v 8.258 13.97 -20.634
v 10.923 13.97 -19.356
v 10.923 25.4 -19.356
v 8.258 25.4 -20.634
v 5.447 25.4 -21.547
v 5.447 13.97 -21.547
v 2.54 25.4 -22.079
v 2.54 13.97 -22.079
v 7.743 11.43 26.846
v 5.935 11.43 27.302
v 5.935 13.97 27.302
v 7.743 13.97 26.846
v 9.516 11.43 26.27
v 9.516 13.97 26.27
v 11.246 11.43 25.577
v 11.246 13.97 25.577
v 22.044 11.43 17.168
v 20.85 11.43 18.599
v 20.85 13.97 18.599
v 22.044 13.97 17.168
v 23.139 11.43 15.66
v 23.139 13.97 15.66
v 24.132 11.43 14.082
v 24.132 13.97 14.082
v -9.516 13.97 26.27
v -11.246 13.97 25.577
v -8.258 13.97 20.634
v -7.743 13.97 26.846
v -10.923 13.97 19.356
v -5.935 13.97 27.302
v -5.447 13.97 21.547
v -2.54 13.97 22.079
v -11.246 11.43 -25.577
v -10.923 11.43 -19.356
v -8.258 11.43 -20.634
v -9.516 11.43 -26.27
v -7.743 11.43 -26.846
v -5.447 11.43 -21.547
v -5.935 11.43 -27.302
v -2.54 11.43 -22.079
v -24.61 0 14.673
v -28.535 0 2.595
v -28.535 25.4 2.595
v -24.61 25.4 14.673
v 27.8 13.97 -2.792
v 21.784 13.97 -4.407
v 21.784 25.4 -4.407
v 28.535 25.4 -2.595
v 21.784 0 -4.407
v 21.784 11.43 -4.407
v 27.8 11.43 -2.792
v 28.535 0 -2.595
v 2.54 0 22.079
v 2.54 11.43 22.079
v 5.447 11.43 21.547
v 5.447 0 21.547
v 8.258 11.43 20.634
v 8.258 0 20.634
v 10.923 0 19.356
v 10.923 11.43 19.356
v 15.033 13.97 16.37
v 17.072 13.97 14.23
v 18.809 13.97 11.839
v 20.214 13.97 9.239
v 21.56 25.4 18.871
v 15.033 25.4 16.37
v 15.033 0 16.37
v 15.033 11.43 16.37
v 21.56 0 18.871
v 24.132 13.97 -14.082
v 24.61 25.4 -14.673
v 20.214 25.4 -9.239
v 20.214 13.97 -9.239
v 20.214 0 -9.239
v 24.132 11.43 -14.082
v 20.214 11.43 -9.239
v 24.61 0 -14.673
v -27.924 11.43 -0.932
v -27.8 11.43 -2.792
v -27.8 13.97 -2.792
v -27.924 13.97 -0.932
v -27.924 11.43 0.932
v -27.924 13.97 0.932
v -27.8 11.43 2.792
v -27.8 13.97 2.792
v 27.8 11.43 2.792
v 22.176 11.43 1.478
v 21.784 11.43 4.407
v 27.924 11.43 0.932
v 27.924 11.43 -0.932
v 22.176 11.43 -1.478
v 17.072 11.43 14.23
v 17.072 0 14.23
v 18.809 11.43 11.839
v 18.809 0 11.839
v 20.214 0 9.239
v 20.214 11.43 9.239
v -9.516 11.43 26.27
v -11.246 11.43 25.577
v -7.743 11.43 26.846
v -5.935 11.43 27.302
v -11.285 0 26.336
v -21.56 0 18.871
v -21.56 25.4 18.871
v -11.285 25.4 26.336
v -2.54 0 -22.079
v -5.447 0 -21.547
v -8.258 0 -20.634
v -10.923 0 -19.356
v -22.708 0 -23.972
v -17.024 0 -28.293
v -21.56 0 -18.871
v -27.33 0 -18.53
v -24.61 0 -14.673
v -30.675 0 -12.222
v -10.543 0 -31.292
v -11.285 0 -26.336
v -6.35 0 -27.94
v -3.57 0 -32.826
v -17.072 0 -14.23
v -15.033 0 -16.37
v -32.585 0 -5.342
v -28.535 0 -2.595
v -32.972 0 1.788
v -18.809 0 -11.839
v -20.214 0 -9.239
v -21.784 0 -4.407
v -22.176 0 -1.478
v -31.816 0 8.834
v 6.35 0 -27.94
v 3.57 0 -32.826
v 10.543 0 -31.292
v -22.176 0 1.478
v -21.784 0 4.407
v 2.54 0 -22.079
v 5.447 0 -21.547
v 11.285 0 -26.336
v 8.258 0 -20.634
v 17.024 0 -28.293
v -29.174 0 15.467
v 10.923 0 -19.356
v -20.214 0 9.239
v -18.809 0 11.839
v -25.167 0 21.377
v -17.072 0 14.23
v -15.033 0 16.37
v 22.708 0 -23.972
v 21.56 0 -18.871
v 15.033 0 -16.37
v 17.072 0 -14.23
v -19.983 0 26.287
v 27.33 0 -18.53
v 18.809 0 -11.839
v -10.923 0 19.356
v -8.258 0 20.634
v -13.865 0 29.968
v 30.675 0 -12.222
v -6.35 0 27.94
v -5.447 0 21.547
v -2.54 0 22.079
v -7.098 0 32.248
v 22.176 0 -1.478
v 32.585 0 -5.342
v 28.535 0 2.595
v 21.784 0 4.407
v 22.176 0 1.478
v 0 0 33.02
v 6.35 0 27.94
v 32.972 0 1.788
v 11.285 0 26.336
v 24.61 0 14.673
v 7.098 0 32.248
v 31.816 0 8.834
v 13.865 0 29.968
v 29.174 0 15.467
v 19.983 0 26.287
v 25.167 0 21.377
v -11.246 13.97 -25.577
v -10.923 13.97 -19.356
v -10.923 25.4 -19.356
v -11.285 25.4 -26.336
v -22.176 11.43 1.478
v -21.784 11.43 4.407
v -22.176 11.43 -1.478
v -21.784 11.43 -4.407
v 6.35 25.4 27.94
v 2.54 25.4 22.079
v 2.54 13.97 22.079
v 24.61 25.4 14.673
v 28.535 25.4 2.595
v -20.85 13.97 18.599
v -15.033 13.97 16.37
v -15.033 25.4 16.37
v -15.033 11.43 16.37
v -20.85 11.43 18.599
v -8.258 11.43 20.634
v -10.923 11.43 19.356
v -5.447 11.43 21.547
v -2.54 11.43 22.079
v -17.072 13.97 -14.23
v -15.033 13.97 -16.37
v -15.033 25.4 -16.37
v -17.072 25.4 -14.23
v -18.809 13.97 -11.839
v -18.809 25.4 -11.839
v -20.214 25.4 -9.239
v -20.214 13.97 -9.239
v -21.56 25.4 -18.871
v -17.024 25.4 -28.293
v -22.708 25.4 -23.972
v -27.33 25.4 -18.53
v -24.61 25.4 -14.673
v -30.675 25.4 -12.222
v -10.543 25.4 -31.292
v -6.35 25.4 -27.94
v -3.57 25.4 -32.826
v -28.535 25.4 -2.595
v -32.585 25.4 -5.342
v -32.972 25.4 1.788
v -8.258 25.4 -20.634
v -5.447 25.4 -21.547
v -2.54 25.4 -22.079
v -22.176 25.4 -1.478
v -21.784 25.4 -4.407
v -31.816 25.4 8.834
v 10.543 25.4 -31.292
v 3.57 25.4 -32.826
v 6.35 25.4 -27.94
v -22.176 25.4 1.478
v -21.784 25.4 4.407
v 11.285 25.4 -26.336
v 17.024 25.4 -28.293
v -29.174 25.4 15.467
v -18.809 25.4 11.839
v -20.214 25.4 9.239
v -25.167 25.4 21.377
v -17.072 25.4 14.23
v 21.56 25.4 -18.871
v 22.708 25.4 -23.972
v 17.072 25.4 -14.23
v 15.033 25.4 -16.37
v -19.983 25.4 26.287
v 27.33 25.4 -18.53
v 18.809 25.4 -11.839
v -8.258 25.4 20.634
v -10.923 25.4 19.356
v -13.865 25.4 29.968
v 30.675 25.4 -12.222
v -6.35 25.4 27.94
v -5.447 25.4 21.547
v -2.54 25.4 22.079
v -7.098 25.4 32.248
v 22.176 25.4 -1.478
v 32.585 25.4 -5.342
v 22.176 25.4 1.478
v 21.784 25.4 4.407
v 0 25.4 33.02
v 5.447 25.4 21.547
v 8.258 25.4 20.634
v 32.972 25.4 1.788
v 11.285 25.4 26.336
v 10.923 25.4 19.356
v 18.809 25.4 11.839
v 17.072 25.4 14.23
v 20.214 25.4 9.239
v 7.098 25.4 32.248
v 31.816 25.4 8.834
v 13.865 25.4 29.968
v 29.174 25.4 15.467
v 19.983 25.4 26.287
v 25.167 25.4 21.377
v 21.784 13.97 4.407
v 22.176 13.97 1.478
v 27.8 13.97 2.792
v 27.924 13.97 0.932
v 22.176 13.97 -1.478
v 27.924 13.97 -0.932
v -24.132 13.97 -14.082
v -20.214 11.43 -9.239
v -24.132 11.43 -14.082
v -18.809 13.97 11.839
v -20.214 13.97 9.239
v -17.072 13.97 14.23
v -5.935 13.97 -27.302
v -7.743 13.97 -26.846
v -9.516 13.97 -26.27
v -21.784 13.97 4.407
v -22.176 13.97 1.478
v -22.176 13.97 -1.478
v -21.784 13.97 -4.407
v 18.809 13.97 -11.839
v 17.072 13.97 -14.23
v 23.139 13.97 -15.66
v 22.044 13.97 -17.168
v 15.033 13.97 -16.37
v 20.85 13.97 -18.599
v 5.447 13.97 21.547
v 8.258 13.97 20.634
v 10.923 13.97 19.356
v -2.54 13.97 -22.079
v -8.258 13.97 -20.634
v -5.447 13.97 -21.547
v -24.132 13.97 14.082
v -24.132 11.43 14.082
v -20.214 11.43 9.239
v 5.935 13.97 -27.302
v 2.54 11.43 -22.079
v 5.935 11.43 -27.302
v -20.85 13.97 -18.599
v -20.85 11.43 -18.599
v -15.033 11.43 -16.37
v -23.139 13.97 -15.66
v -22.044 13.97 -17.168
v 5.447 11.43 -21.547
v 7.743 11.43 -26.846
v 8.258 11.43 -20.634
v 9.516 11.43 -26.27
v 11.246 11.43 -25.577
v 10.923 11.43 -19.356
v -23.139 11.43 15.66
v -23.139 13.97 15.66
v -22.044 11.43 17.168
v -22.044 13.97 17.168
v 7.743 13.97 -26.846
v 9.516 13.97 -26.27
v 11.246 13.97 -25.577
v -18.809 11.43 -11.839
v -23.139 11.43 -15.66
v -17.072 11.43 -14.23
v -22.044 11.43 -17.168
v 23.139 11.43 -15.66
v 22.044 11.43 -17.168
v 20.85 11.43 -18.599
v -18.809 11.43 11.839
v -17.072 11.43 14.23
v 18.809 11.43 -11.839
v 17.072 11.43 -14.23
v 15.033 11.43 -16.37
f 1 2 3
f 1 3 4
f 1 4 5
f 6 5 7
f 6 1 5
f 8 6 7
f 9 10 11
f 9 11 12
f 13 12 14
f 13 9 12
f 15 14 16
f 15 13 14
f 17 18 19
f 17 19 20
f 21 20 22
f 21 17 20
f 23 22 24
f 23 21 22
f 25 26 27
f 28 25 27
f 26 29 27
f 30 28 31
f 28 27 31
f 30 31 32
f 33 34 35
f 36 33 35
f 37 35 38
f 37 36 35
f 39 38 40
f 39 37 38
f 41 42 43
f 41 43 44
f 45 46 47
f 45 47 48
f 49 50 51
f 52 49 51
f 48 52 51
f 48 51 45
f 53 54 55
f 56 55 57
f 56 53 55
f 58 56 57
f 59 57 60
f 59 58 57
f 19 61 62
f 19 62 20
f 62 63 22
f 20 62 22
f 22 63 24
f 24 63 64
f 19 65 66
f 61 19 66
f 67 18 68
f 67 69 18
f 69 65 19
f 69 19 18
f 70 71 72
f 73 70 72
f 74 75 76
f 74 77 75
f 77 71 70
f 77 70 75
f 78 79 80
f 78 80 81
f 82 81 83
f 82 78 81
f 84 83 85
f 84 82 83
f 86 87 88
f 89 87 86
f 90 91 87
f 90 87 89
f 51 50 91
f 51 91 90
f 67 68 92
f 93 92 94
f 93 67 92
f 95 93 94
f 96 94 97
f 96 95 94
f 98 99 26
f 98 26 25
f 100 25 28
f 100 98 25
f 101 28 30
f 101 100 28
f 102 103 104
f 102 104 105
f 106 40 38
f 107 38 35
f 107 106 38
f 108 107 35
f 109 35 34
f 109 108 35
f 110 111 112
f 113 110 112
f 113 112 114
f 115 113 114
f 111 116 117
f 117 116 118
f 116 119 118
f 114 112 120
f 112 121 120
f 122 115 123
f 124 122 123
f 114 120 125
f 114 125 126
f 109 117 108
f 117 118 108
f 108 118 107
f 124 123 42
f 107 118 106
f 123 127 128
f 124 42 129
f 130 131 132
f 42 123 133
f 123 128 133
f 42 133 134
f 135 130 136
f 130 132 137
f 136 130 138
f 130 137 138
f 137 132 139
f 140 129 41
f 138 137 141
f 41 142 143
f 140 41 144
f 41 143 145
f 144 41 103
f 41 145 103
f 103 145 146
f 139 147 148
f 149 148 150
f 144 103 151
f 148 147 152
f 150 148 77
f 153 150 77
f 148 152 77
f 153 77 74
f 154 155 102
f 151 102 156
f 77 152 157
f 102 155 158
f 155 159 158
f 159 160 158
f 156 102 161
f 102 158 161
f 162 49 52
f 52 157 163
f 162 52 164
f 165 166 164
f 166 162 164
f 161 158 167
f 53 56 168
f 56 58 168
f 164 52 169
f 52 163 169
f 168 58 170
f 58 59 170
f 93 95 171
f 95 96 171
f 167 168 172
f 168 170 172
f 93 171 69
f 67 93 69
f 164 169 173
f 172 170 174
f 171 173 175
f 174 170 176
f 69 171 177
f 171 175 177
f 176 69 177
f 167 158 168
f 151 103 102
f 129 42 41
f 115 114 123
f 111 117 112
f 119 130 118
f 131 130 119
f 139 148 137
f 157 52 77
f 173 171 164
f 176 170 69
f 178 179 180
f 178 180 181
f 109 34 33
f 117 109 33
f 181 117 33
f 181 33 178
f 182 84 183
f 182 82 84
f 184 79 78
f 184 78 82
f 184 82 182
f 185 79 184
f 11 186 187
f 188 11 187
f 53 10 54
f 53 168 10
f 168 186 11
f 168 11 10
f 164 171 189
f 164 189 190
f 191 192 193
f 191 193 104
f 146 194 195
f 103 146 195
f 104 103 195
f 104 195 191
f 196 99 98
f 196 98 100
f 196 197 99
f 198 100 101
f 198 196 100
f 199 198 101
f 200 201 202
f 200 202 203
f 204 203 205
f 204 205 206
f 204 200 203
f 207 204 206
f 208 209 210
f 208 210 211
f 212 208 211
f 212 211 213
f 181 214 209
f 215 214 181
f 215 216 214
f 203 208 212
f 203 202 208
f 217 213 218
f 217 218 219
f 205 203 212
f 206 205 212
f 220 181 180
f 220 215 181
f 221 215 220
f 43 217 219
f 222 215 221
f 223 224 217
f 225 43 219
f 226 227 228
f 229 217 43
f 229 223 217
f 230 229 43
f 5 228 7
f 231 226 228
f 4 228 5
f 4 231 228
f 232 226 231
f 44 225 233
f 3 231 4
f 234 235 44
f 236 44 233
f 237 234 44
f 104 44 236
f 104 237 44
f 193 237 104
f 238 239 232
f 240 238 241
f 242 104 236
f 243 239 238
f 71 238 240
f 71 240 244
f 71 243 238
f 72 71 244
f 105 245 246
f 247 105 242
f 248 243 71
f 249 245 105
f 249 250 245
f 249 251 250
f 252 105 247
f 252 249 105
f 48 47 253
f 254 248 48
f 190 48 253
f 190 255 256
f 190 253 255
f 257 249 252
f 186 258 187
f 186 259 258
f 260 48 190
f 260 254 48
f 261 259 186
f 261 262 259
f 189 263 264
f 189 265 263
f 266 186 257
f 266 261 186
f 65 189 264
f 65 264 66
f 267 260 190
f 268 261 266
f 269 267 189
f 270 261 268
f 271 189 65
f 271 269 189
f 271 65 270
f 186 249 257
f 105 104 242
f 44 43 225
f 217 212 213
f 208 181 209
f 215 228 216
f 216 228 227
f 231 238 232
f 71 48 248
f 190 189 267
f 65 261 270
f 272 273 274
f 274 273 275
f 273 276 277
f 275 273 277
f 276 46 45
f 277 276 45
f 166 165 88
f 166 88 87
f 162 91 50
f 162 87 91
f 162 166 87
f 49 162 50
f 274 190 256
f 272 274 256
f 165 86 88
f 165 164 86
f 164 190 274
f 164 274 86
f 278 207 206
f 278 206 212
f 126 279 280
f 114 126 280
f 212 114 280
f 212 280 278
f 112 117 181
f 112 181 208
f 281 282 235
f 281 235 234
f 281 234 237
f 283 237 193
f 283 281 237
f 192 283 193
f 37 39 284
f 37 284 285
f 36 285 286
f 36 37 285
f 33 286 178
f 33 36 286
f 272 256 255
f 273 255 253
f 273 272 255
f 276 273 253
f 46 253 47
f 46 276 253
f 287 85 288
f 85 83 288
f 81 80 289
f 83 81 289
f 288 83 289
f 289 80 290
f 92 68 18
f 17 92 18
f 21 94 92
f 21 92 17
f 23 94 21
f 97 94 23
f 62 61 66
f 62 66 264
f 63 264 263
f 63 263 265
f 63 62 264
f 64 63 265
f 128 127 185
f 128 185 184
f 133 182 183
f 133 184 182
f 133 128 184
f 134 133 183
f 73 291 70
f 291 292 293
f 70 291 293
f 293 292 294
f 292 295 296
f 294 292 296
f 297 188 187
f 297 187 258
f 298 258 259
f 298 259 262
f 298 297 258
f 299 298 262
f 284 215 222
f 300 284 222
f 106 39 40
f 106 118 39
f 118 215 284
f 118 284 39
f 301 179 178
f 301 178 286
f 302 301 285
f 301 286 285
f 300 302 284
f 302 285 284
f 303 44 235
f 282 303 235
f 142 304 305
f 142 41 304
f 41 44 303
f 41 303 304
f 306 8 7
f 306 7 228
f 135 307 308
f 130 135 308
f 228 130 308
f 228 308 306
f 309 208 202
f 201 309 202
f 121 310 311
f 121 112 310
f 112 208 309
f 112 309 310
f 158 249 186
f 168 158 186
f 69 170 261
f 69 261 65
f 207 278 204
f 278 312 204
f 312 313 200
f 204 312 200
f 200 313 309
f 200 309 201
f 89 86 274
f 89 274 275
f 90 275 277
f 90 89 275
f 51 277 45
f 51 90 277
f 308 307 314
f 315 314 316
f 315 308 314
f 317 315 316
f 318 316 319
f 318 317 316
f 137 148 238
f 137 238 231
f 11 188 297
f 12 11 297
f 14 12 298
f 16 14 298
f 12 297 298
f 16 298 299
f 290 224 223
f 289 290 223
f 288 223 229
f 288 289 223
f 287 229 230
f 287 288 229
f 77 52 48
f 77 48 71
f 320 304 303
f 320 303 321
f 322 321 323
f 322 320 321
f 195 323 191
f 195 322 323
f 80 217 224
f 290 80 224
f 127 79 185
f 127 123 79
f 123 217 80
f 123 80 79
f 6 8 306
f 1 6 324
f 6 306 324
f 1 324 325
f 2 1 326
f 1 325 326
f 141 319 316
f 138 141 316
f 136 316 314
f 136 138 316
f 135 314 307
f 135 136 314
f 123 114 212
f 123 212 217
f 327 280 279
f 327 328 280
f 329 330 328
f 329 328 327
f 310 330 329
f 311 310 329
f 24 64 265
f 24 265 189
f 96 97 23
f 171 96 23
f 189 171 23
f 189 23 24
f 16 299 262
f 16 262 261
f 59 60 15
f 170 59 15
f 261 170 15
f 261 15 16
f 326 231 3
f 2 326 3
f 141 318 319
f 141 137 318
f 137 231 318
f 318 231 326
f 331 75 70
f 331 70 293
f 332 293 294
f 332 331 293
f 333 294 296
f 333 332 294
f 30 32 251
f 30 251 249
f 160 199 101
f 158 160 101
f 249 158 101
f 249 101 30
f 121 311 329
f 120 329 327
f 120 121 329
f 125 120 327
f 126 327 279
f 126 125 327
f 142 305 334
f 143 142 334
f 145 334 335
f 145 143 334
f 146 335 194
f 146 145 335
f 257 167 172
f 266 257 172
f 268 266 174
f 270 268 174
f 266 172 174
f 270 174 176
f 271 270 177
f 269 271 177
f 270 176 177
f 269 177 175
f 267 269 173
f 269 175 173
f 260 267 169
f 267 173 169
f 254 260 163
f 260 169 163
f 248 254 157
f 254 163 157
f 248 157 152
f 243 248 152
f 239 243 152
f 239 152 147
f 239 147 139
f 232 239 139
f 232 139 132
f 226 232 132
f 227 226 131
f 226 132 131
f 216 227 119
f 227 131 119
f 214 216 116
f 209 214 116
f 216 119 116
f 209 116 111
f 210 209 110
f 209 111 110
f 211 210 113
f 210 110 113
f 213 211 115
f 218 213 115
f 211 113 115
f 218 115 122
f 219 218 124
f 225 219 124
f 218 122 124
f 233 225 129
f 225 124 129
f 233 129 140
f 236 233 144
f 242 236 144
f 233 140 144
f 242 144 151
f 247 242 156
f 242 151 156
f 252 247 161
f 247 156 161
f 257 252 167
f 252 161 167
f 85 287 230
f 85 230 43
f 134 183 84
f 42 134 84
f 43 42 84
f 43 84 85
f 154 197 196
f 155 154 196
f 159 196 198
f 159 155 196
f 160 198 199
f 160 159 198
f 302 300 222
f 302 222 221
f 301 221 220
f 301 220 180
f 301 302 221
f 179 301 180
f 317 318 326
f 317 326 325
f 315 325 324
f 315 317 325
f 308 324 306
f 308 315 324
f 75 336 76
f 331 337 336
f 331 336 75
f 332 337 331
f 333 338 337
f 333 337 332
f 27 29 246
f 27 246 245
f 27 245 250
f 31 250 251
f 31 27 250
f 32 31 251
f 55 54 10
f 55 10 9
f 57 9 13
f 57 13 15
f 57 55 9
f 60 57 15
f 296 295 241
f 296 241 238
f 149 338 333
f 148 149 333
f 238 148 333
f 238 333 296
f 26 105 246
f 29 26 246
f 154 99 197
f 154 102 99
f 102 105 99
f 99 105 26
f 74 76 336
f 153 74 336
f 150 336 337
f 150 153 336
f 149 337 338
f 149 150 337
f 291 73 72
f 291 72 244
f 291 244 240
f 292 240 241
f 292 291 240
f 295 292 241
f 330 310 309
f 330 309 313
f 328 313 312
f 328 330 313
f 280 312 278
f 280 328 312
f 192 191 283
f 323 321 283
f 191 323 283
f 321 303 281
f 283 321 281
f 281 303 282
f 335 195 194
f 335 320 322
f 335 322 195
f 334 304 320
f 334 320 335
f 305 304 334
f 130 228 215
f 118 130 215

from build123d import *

# Parameters (mm, degrees)
SKETCH1_R           = 33.02
SKETCH1_R_2         = 22.225
BOSS_EXTRUDE1_DEPTH = 25.4
CAVITY1_DEPTH       = 25.4
CAVITY1_START       = 11.43
CAVITY1_2_DEPTH     = 2.54


# Read off the part's stored shape, not the designer's step: Cavity1
with BuildPart() as part:
    # Sketch1 → Boss-Extrude1 (new body)
    with BuildSketch(Plane(origin=(0, 0, 0), x_dir=(1, 0, 0), z_dir=(0, 1, 0))):
        with Locations(Location((0, 0, 0), (0, 0, 270))):
            Circle(SKETCH1_R)
        with Locations(Location((0, 0, 0), (0, 0, 270))):
            Circle(SKETCH1_R_2, mode=Mode.SUBTRACT)
    extrude(amount=BOSS_EXTRUDE1_DEPTH)

    # Cavity1 outline → Cavity1 (cut)
    with BuildSketch(Plane(origin=(0, 0, 0), x_dir=(1, 0, 0), z_dir=(0, 1, 0))):
        with BuildLine():
            Line((-6.35, -27.94), (6.35, -27.94))
            Line((6.35, -27.94), (2.54, -22.079380086))
            ThreePointArc((2.54, -22.079380086), (0, -22.225), (-2.54, -22.079380086))
            Line((-2.54, -22.079380086), (-6.35, -27.94))
        make_face()
        with BuildLine():
            Line((10.923030829, -19.355568256), (11.285462035, -26.336371175))
            Line((11.285462035, -26.336371175), (21.559977863, -18.871498471))
            Line((21.559977863, -18.871498471), (15.03283716, -16.369619174))
            ThreePointArc((15.03283716, -16.369619174), (13.063527232, -17.9804027), (10.923030829, -19.355568256))
        make_face()
        with BuildLine():
            Line((-11.285462035, -26.336371175), (-10.923030829, -19.355568256))
            ThreePointArc((-10.923030829, -19.355568256), (-13.063527232, -17.9804027), (-15.03283716, -16.369619174))
            Line((-15.03283716, -16.369619174), (-21.559977863, -18.871498471))
            Line((-21.559977863, -18.871498471), (-11.285462035, -26.336371175))
        make_face()
        with BuildLine():
            ThreePointArc((21.783641473, -4.407220121), (21.137231075, -6.8679027), (20.213835141, -9.238587223))
            Line((20.213835141, -9.238587223), (24.610261151, -14.673143701))
            Line((24.610261151, -14.673143701), (28.53477698, -2.594725944))
            Line((28.53477698, -2.594725944), (21.783641473, -4.407220121))
        make_face()
        with BuildLine():
            Line((-24.610261151, -14.673143701), (-20.213835141, -9.238587223))
            ThreePointArc((-20.213835141, -9.238587223), (-21.137231075, -6.8679027), (-21.783641473, -4.407220121))
            Line((-21.783641473, -4.407220121), (-28.53477698, -2.594725944))
            Line((-28.53477698, -2.594725944), (-24.610261151, -14.673143701))
        make_face()
        with BuildLine():
            Line((-28.53477698, 2.594725944), (-21.783641473, 4.407220121))
            ThreePointArc((-21.783641473, 4.407220121), (-21.137231075, 6.8679027), (-20.213835141, 9.238587223))
            Line((-20.213835141, 9.238587223), (-24.610261151, 14.673143701))
            Line((-24.610261151, 14.673143701), (-28.53477698, 2.594725944))
        make_face()
        with BuildLine():
            Line((21.783641473, 4.407220121), (28.53477698, 2.594725944))
            Line((28.53477698, 2.594725944), (24.610261151, 14.673143701))
            Line((24.610261151, 14.673143701), (20.213835141, 9.238587223))
            ThreePointArc((20.213835141, 9.238587223), (21.137231075, 6.8679027), (21.783641473, 4.407220121))
        make_face()
        with BuildLine():
            Line((-21.559977863, 18.871498471), (-15.03283716, 16.369619174))
            ThreePointArc((-15.03283716, 16.369619174), (-13.063527232, 17.9804027), (-10.923030829, 19.355568256))
            Line((-10.923030829, 19.355568256), (-11.285462035, 26.336371175))
            Line((-11.285462035, 26.336371175), (-21.559977863, 18.871498471))
        make_face()
        with BuildLine():
            ThreePointArc((10.923030829, 19.355568256), (13.063527232, 17.9804027), (15.03283716, 16.369619174))
            Line((15.03283716, 16.369619174), (21.559977863, 18.871498471))
            Line((21.559977863, 18.871498471), (11.285462035, 26.336371175))
            Line((11.285462035, 26.336371175), (10.923030829, 19.355568256))
        make_face()
        with BuildLine():
            Line((-6.35, 27.94), (-2.54, 22.079380086))
            ThreePointArc((-2.54, 22.079380086), (0, 22.225), (2.54, 22.079380086))
            Line((2.54, 22.079380086), (6.35, 27.94))
            Line((6.35, 27.94), (-6.35, 27.94))
        make_face()
    extrude(amount=CAVITY1_DEPTH, mode=Mode.SUBTRACT)

    # Cavity1 2 outline → Cavity1 2 (cut)
    with BuildSketch(Plane(origin=(0, 0, 0), x_dir=(1, 0, 0), z_dir=(0, 1, 0)).offset(CAVITY1_START)):
        with BuildLine():
            Line((2.54, -22.079380086), (5.935416317, -27.3022789))
            ThreePointArc((5.935416317, -27.3022789), (8.633934823, -26.572519065), (11.246024223, -25.576757793))
            Line((11.246024223, -25.576757793), (10.923030829, -19.355568256))
            ThreePointArc((10.923030829, -19.355568256), (6.8679027, -21.137231075), (2.54, -22.079380086))
        make_face()
        with BuildLine():
            ThreePointArc((-11.246024223, -25.576757793), (-8.633934823, -26.572519065), (-5.935416317, -27.3022789))
            Line((-5.935416317, -27.3022789), (-2.54, -22.079380086))
            ThreePointArc((-2.54, -22.079380086), (-6.8679027, -21.137231075), (-10.923030829, -19.355568256))
            Line((-10.923030829, -19.355568256), (-11.246024223, -25.576757793))
        make_face()
        with BuildLine():
            ThreePointArc((20.213835141, -9.238587223), (17.9804027, -13.063527232), (15.03283716, -16.369619174))
            Line((15.03283716, -16.369619174), (20.84972956, -18.599257438))
            ThreePointArc((20.84972956, -18.599257438), (22.603934823, -16.422719949), (24.131865747, -14.08178453))
            Line((24.131865747, -14.08178453), (20.213835141, -9.238587223))
        make_face()
        with BuildLine():
            Line((-20.84972956, -18.599257438), (-15.03283716, -16.369619174))
            ThreePointArc((-15.03283716, -16.369619174), (-17.9804027, -13.063527232), (-20.213835141, -9.238587223))
            Line((-20.213835141, -9.238587223), (-24.131865747, -14.08178453))
            ThreePointArc((-24.131865747, -14.08178453), (-22.603934823, -16.422719949), (-20.84972956, -18.599257438))
        make_face()
        with BuildLine():
            ThreePointArc((21.783641473, 4.407220121), (22.225, 0), (21.783641473, -4.407220121))
            Line((21.783641473, -4.407220121), (27.800154768, -2.7919518))
            ThreePointArc((27.800154768, -2.7919518), (27.94, 0), (27.800154768, 2.7919518))
            Line((27.800154768, 2.7919518), (21.783641473, 4.407220121))
        make_face()
        with BuildLine():
            Line((-27.800154768, -2.7919518), (-21.783641473, -4.407220121))
            ThreePointArc((-21.783641473, -4.407220121), (-22.225, 0), (-21.783641473, 4.407220121))
            Line((-21.783641473, 4.407220121), (-27.800154768, 2.7919518))
            ThreePointArc((-27.800154768, 2.7919518), (-27.94, 0), (-27.800154768, -2.7919518))
        make_face()
        with BuildLine():
            Line((-24.131865747, 14.08178453), (-20.213835141, 9.238587223))
            ThreePointArc((-20.213835141, 9.238587223), (-17.9804027, 13.063527232), (-15.03283716, 16.369619174))
            Line((-15.03283716, 16.369619174), (-20.84972956, 18.599257438))
            ThreePointArc((-20.84972956, 18.599257438), (-22.603934823, 16.422719949), (-24.131865747, 14.08178453))
        make_face()
        with BuildLine():
            ThreePointArc((15.03283716, 16.369619174), (17.9804027, 13.063527232), (20.213835141, 9.238587223))
            Line((20.213835141, 9.238587223), (24.131865747, 14.08178453))
            ThreePointArc((24.131865747, 14.08178453), (22.603934823, 16.422719949), (20.84972956, 18.599257438))
            Line((20.84972956, 18.599257438), (15.03283716, 16.369619174))
        make_face()
        with BuildLine():
            Line((-11.246024223, 25.576757793), (-10.923030829, 19.355568256))
            ThreePointArc((-10.923030829, 19.355568256), (-6.8679027, 21.137231075), (-2.54, 22.079380086))
            Line((-2.54, 22.079380086), (-5.935416317, 27.3022789))
            ThreePointArc((-5.935416317, 27.3022789), (-8.633934823, 26.572519065), (-11.246024223, 25.576757793))
        make_face()
        with BuildLine():
            ThreePointArc((2.54, 22.079380086), (6.8679027, 21.137231075), (10.923030829, 19.355568256))
            Line((10.923030829, 19.355568256), (11.246024223, 25.576757793))
            ThreePointArc((11.246024223, 25.576757793), (8.633934823, 26.572519065), (5.935416317, 27.3022789))
            Line((5.935416317, 27.3022789), (2.54, 22.079380086))
        make_face()
    extrude(amount=CAVITY1_2_DEPTH, mode=Mode.SUBTRACT)


solid = part.part
